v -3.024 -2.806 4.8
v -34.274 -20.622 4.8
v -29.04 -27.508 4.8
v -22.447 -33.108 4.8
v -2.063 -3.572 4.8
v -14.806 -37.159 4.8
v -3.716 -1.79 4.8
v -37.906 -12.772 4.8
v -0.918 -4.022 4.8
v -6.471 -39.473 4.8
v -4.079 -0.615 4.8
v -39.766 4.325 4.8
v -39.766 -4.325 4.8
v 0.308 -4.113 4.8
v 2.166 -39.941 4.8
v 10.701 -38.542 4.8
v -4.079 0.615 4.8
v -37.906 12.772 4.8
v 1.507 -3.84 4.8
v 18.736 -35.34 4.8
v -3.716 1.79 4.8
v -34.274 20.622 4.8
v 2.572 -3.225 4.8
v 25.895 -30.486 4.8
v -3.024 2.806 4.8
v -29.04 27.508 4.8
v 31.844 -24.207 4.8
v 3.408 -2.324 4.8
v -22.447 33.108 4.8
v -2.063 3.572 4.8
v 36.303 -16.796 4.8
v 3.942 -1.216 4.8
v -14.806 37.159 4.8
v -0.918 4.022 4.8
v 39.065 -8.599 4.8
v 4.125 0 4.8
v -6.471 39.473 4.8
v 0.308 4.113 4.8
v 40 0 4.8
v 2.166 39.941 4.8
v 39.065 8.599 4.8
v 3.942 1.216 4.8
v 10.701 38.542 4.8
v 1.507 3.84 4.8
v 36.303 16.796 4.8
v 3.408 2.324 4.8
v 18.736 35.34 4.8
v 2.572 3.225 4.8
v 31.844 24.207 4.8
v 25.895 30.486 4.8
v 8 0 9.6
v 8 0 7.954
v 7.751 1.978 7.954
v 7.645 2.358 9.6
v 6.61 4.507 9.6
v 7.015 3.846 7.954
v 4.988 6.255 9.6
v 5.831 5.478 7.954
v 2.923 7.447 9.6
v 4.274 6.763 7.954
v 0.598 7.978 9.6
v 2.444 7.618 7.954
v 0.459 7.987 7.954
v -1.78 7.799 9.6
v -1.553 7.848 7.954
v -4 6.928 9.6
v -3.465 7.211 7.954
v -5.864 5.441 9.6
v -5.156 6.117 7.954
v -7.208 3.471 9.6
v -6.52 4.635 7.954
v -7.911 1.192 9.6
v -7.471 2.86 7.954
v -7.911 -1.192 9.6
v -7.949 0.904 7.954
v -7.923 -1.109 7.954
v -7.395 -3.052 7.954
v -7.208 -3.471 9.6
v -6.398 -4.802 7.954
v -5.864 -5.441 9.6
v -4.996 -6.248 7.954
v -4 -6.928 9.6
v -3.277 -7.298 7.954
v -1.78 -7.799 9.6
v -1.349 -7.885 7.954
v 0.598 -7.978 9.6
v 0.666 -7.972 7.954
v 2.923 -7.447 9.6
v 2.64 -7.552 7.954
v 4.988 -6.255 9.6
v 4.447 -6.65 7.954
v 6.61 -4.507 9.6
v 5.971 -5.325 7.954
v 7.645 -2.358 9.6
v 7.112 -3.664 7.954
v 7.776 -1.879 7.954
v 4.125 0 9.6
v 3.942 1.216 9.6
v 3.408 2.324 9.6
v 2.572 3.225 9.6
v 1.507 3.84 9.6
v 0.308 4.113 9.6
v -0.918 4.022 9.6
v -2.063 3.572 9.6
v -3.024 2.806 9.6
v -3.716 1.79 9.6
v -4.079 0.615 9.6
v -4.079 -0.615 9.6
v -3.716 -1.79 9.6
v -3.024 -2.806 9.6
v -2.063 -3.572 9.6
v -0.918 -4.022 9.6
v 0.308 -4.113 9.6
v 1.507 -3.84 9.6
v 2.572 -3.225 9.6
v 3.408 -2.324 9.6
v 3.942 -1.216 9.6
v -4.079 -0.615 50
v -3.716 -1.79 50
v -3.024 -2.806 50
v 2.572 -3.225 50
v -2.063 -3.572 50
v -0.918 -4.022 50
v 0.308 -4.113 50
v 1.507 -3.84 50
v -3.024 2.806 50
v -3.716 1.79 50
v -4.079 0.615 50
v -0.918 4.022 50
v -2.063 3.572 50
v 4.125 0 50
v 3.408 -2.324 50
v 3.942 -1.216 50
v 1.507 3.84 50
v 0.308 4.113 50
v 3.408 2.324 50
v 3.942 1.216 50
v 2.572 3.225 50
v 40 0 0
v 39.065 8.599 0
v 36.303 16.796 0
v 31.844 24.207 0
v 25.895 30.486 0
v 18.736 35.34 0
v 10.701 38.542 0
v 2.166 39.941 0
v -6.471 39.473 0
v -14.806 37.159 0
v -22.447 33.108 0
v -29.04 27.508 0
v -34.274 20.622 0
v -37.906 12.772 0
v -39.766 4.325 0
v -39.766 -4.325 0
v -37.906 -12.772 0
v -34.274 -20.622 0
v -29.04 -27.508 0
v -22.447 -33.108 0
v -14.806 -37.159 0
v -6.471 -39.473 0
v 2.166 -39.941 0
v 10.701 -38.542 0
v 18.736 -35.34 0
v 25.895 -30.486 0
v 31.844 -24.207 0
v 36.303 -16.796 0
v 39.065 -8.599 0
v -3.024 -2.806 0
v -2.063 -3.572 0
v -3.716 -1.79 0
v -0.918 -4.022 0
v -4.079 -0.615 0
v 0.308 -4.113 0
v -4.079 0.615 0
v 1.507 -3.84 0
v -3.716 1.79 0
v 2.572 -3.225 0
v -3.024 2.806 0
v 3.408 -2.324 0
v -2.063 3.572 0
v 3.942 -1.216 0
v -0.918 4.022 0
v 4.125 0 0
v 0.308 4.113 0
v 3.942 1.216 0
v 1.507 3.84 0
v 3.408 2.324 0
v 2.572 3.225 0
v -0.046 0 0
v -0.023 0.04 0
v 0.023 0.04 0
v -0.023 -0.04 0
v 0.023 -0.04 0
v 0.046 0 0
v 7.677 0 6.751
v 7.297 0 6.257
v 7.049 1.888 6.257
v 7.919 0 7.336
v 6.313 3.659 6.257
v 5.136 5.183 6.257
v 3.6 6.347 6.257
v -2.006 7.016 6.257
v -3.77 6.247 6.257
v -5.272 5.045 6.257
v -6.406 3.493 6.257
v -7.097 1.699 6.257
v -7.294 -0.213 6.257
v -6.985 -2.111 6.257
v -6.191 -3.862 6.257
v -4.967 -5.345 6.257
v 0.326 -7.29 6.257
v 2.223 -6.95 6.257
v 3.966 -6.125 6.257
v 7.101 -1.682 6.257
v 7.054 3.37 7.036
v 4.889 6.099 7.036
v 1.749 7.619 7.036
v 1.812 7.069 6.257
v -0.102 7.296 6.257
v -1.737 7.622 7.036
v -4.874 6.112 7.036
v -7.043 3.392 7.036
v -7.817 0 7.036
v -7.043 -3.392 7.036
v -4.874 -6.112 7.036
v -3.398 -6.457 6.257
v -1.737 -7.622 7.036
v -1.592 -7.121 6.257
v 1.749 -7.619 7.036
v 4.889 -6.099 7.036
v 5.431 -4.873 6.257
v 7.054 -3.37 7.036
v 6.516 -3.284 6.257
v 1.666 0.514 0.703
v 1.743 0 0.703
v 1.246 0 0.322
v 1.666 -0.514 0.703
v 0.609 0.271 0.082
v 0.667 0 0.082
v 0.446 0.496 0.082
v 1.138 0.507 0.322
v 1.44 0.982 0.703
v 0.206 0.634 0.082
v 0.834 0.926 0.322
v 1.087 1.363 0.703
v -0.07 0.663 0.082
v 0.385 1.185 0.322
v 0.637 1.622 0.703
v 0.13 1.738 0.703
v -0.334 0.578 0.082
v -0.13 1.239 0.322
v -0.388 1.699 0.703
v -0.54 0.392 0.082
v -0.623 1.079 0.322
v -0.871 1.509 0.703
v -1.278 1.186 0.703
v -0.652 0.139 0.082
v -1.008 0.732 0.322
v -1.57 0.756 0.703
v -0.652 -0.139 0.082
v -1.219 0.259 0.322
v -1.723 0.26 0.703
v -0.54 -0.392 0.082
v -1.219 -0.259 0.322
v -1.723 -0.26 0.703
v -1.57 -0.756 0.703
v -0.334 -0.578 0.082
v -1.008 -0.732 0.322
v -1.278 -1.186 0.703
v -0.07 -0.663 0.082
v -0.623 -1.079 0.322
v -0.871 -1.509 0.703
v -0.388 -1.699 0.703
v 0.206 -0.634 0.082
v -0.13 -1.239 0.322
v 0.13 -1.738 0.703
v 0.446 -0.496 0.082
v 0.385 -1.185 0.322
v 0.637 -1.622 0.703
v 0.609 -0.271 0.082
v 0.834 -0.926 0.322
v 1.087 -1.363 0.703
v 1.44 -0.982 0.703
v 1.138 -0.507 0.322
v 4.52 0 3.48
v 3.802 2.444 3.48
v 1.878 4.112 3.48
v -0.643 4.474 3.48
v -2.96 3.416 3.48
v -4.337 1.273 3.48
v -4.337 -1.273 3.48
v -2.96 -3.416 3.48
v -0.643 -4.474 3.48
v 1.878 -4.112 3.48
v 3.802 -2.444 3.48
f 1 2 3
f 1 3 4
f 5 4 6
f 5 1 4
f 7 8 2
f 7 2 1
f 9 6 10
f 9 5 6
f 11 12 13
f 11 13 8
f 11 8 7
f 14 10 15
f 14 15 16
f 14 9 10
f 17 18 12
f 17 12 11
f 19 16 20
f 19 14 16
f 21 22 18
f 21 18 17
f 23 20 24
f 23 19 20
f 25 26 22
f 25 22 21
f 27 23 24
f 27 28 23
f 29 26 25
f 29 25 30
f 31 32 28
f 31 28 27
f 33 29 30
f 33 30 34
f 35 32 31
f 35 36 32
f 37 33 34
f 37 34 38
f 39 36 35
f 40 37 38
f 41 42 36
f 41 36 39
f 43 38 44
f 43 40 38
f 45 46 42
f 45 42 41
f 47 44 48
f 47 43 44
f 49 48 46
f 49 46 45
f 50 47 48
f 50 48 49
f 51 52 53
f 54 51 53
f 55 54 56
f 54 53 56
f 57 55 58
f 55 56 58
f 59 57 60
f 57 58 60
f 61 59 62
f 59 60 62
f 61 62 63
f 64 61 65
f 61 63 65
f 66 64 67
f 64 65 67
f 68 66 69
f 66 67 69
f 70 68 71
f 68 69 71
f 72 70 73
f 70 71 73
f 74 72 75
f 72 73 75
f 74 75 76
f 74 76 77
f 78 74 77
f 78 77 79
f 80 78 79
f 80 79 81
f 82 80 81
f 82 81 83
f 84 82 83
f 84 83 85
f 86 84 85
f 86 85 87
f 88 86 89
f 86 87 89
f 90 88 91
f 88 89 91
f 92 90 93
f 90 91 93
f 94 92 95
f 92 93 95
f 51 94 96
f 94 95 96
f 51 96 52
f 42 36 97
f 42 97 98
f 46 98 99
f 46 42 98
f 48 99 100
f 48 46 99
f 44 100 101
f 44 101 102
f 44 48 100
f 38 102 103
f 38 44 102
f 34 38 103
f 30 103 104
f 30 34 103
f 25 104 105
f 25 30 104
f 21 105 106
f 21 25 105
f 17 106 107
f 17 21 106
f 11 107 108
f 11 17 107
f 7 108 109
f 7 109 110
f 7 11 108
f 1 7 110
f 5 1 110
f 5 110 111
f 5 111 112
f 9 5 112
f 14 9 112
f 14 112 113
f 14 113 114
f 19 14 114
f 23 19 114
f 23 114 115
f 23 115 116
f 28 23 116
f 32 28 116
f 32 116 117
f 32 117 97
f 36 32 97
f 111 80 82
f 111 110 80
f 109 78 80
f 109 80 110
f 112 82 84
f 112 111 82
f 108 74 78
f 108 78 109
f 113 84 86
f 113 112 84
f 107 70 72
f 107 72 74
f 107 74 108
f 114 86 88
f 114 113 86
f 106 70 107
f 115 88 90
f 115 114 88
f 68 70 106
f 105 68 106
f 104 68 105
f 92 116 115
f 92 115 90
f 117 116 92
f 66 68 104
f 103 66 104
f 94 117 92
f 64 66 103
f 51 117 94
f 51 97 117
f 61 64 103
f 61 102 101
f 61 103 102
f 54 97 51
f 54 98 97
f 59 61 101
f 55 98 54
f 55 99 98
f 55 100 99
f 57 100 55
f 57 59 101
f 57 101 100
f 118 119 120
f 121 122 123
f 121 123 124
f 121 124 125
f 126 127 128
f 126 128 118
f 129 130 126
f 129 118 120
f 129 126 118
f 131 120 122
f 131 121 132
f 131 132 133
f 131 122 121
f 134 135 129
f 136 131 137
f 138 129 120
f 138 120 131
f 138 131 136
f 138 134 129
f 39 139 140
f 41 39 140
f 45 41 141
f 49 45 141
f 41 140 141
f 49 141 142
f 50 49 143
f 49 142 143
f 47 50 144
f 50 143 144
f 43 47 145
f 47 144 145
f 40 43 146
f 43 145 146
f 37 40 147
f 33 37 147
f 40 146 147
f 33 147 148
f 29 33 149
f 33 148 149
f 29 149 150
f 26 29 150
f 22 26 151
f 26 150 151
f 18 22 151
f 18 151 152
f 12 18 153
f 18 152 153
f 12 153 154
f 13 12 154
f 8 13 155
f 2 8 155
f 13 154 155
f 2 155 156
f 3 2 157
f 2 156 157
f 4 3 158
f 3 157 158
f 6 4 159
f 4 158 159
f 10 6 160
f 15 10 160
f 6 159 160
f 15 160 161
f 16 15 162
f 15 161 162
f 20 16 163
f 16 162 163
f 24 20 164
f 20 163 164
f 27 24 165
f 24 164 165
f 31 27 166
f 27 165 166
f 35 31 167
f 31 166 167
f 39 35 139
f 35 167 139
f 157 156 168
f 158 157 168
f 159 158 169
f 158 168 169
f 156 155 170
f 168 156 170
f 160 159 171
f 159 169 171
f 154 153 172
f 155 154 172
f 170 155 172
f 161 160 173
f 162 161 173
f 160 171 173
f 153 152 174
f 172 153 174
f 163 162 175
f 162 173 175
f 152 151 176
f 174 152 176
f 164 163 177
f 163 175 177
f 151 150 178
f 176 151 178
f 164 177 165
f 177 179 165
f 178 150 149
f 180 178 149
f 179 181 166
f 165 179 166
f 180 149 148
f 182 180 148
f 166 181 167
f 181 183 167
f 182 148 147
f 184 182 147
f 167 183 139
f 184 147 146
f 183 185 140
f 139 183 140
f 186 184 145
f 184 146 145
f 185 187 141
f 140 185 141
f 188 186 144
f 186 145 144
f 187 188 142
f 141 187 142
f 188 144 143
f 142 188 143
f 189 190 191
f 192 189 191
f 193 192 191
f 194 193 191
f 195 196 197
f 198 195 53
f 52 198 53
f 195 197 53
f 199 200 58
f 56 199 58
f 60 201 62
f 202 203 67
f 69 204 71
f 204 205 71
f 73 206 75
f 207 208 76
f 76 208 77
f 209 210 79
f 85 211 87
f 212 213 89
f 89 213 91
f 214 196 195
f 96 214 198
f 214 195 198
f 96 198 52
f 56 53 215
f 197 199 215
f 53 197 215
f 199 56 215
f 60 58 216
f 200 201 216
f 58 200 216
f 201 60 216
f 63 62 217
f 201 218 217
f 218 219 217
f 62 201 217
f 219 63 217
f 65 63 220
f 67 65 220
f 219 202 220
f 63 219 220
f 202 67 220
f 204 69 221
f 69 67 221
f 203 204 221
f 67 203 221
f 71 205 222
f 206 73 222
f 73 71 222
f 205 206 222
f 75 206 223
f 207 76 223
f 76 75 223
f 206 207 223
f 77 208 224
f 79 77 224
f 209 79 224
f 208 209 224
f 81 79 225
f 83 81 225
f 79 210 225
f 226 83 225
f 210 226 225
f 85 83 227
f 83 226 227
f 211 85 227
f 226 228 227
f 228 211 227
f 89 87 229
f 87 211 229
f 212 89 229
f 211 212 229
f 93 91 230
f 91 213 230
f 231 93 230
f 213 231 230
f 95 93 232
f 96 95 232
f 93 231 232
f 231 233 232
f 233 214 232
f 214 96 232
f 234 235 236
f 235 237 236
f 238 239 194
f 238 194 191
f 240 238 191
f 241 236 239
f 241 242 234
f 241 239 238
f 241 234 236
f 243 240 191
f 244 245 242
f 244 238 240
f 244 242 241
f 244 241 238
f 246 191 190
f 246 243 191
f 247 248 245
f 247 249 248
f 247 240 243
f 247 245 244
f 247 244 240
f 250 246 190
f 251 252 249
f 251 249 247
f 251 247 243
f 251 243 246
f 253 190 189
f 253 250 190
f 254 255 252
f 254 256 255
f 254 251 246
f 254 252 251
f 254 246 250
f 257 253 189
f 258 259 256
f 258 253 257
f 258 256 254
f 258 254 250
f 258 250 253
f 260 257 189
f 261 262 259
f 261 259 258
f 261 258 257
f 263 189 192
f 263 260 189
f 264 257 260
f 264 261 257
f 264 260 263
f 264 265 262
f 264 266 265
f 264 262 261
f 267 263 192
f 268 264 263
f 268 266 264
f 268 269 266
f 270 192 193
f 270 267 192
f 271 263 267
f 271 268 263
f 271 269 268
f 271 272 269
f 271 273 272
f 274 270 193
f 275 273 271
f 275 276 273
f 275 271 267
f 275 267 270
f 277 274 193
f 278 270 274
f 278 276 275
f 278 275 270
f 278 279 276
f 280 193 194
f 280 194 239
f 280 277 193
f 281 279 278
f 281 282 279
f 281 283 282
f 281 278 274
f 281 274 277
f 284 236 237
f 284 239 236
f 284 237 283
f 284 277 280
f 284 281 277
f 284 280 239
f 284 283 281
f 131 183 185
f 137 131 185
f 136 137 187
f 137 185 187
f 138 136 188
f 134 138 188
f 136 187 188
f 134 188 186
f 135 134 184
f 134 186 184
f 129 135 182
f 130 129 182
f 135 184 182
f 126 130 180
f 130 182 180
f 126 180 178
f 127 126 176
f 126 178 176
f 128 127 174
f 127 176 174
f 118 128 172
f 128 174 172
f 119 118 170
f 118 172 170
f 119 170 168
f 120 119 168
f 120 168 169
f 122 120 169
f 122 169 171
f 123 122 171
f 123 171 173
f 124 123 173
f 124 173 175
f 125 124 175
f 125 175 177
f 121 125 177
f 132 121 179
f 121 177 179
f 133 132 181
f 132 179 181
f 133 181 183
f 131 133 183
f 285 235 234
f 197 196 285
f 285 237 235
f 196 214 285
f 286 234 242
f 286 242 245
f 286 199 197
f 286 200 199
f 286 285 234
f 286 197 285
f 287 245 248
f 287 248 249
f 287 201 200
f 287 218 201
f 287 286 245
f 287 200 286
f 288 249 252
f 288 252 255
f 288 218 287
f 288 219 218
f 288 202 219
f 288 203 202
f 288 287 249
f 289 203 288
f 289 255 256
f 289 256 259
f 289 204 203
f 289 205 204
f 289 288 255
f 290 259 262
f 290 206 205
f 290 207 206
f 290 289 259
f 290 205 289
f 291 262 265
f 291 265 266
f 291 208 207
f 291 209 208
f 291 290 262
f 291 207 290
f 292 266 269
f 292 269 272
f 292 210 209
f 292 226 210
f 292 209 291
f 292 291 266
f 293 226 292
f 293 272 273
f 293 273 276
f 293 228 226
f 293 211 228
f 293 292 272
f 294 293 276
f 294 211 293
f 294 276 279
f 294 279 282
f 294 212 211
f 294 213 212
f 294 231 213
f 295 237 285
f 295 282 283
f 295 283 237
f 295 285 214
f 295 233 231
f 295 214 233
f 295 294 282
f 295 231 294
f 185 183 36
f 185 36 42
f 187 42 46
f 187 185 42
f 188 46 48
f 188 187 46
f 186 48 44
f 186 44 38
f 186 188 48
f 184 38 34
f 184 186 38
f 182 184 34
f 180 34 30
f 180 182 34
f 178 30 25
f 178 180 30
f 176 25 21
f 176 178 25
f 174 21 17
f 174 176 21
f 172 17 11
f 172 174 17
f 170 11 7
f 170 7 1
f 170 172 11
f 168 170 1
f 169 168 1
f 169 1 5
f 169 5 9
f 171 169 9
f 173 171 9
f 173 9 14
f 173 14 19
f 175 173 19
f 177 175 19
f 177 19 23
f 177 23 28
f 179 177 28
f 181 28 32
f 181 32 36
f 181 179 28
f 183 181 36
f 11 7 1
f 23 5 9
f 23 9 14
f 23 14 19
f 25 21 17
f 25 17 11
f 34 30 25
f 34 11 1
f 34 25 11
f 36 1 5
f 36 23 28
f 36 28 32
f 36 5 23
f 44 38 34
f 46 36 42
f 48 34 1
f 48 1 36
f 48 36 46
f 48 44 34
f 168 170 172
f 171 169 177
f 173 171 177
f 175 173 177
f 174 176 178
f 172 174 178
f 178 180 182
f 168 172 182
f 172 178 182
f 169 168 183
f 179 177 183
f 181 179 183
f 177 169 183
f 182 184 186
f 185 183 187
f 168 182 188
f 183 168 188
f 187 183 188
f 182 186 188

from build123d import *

# Parameters (mm, degrees)
F2_R     = 8
F2_R_2   = 4.125
F3_DEPTH = 9.6
F4_DEPTH = 4.8
F5_SIZE  = 6.96
F6_R     = 2.4
F2_R_3   = 40
F7_DEPTH = 4.8
F8_DEPTH = 50


with BuildPart() as f3:
    # F2 (on Top) → F3 (new body)
    with BuildSketch(Plane.XY):
        Circle(F2_R)
        Circle(F2_R_2, mode=Mode.SUBTRACT)
    extrude(amount=F3_DEPTH)

    # F2 (on Top) → F4 (join)
    with BuildSketch(Plane.XY):
        Circle(F2_R_2)
    extrude(amount=F4_DEPTH)

    # F5
    f5_edges = [f3.edges().sort_by_distance(p)[0] for p in [
        (-8, 0, 0),
    ]]
    chamfer(f5_edges, length=F5_SIZE)

    # F6
    f6_edges = [f3.edges().sort_by_distance(p)[0] for p in [
        (-8, 0, 6.96),
        (-1.04, 0, 0),
    ]]
    fillet(f6_edges, radius=F6_R)


with BuildPart() as f7:
    # F2 (on Top) → F7 (new body)
    with BuildSketch(Plane.XY):
        Circle(F2_R_3)
        Circle(F2_R, mode=Mode.SUBTRACT)
        Circle(F2_R)
        Circle(F2_R_2, mode=Mode.SUBTRACT)
    extrude(amount=F7_DEPTH)


with BuildPart() as f8:
    # F2 (on Top) → F8 (new body)
    with BuildSketch(Plane.XY):
        Circle(F2_R_2)
    extrude(amount=F8_DEPTH)


solid = Compound([f3.part, f7.part, f8.part])
